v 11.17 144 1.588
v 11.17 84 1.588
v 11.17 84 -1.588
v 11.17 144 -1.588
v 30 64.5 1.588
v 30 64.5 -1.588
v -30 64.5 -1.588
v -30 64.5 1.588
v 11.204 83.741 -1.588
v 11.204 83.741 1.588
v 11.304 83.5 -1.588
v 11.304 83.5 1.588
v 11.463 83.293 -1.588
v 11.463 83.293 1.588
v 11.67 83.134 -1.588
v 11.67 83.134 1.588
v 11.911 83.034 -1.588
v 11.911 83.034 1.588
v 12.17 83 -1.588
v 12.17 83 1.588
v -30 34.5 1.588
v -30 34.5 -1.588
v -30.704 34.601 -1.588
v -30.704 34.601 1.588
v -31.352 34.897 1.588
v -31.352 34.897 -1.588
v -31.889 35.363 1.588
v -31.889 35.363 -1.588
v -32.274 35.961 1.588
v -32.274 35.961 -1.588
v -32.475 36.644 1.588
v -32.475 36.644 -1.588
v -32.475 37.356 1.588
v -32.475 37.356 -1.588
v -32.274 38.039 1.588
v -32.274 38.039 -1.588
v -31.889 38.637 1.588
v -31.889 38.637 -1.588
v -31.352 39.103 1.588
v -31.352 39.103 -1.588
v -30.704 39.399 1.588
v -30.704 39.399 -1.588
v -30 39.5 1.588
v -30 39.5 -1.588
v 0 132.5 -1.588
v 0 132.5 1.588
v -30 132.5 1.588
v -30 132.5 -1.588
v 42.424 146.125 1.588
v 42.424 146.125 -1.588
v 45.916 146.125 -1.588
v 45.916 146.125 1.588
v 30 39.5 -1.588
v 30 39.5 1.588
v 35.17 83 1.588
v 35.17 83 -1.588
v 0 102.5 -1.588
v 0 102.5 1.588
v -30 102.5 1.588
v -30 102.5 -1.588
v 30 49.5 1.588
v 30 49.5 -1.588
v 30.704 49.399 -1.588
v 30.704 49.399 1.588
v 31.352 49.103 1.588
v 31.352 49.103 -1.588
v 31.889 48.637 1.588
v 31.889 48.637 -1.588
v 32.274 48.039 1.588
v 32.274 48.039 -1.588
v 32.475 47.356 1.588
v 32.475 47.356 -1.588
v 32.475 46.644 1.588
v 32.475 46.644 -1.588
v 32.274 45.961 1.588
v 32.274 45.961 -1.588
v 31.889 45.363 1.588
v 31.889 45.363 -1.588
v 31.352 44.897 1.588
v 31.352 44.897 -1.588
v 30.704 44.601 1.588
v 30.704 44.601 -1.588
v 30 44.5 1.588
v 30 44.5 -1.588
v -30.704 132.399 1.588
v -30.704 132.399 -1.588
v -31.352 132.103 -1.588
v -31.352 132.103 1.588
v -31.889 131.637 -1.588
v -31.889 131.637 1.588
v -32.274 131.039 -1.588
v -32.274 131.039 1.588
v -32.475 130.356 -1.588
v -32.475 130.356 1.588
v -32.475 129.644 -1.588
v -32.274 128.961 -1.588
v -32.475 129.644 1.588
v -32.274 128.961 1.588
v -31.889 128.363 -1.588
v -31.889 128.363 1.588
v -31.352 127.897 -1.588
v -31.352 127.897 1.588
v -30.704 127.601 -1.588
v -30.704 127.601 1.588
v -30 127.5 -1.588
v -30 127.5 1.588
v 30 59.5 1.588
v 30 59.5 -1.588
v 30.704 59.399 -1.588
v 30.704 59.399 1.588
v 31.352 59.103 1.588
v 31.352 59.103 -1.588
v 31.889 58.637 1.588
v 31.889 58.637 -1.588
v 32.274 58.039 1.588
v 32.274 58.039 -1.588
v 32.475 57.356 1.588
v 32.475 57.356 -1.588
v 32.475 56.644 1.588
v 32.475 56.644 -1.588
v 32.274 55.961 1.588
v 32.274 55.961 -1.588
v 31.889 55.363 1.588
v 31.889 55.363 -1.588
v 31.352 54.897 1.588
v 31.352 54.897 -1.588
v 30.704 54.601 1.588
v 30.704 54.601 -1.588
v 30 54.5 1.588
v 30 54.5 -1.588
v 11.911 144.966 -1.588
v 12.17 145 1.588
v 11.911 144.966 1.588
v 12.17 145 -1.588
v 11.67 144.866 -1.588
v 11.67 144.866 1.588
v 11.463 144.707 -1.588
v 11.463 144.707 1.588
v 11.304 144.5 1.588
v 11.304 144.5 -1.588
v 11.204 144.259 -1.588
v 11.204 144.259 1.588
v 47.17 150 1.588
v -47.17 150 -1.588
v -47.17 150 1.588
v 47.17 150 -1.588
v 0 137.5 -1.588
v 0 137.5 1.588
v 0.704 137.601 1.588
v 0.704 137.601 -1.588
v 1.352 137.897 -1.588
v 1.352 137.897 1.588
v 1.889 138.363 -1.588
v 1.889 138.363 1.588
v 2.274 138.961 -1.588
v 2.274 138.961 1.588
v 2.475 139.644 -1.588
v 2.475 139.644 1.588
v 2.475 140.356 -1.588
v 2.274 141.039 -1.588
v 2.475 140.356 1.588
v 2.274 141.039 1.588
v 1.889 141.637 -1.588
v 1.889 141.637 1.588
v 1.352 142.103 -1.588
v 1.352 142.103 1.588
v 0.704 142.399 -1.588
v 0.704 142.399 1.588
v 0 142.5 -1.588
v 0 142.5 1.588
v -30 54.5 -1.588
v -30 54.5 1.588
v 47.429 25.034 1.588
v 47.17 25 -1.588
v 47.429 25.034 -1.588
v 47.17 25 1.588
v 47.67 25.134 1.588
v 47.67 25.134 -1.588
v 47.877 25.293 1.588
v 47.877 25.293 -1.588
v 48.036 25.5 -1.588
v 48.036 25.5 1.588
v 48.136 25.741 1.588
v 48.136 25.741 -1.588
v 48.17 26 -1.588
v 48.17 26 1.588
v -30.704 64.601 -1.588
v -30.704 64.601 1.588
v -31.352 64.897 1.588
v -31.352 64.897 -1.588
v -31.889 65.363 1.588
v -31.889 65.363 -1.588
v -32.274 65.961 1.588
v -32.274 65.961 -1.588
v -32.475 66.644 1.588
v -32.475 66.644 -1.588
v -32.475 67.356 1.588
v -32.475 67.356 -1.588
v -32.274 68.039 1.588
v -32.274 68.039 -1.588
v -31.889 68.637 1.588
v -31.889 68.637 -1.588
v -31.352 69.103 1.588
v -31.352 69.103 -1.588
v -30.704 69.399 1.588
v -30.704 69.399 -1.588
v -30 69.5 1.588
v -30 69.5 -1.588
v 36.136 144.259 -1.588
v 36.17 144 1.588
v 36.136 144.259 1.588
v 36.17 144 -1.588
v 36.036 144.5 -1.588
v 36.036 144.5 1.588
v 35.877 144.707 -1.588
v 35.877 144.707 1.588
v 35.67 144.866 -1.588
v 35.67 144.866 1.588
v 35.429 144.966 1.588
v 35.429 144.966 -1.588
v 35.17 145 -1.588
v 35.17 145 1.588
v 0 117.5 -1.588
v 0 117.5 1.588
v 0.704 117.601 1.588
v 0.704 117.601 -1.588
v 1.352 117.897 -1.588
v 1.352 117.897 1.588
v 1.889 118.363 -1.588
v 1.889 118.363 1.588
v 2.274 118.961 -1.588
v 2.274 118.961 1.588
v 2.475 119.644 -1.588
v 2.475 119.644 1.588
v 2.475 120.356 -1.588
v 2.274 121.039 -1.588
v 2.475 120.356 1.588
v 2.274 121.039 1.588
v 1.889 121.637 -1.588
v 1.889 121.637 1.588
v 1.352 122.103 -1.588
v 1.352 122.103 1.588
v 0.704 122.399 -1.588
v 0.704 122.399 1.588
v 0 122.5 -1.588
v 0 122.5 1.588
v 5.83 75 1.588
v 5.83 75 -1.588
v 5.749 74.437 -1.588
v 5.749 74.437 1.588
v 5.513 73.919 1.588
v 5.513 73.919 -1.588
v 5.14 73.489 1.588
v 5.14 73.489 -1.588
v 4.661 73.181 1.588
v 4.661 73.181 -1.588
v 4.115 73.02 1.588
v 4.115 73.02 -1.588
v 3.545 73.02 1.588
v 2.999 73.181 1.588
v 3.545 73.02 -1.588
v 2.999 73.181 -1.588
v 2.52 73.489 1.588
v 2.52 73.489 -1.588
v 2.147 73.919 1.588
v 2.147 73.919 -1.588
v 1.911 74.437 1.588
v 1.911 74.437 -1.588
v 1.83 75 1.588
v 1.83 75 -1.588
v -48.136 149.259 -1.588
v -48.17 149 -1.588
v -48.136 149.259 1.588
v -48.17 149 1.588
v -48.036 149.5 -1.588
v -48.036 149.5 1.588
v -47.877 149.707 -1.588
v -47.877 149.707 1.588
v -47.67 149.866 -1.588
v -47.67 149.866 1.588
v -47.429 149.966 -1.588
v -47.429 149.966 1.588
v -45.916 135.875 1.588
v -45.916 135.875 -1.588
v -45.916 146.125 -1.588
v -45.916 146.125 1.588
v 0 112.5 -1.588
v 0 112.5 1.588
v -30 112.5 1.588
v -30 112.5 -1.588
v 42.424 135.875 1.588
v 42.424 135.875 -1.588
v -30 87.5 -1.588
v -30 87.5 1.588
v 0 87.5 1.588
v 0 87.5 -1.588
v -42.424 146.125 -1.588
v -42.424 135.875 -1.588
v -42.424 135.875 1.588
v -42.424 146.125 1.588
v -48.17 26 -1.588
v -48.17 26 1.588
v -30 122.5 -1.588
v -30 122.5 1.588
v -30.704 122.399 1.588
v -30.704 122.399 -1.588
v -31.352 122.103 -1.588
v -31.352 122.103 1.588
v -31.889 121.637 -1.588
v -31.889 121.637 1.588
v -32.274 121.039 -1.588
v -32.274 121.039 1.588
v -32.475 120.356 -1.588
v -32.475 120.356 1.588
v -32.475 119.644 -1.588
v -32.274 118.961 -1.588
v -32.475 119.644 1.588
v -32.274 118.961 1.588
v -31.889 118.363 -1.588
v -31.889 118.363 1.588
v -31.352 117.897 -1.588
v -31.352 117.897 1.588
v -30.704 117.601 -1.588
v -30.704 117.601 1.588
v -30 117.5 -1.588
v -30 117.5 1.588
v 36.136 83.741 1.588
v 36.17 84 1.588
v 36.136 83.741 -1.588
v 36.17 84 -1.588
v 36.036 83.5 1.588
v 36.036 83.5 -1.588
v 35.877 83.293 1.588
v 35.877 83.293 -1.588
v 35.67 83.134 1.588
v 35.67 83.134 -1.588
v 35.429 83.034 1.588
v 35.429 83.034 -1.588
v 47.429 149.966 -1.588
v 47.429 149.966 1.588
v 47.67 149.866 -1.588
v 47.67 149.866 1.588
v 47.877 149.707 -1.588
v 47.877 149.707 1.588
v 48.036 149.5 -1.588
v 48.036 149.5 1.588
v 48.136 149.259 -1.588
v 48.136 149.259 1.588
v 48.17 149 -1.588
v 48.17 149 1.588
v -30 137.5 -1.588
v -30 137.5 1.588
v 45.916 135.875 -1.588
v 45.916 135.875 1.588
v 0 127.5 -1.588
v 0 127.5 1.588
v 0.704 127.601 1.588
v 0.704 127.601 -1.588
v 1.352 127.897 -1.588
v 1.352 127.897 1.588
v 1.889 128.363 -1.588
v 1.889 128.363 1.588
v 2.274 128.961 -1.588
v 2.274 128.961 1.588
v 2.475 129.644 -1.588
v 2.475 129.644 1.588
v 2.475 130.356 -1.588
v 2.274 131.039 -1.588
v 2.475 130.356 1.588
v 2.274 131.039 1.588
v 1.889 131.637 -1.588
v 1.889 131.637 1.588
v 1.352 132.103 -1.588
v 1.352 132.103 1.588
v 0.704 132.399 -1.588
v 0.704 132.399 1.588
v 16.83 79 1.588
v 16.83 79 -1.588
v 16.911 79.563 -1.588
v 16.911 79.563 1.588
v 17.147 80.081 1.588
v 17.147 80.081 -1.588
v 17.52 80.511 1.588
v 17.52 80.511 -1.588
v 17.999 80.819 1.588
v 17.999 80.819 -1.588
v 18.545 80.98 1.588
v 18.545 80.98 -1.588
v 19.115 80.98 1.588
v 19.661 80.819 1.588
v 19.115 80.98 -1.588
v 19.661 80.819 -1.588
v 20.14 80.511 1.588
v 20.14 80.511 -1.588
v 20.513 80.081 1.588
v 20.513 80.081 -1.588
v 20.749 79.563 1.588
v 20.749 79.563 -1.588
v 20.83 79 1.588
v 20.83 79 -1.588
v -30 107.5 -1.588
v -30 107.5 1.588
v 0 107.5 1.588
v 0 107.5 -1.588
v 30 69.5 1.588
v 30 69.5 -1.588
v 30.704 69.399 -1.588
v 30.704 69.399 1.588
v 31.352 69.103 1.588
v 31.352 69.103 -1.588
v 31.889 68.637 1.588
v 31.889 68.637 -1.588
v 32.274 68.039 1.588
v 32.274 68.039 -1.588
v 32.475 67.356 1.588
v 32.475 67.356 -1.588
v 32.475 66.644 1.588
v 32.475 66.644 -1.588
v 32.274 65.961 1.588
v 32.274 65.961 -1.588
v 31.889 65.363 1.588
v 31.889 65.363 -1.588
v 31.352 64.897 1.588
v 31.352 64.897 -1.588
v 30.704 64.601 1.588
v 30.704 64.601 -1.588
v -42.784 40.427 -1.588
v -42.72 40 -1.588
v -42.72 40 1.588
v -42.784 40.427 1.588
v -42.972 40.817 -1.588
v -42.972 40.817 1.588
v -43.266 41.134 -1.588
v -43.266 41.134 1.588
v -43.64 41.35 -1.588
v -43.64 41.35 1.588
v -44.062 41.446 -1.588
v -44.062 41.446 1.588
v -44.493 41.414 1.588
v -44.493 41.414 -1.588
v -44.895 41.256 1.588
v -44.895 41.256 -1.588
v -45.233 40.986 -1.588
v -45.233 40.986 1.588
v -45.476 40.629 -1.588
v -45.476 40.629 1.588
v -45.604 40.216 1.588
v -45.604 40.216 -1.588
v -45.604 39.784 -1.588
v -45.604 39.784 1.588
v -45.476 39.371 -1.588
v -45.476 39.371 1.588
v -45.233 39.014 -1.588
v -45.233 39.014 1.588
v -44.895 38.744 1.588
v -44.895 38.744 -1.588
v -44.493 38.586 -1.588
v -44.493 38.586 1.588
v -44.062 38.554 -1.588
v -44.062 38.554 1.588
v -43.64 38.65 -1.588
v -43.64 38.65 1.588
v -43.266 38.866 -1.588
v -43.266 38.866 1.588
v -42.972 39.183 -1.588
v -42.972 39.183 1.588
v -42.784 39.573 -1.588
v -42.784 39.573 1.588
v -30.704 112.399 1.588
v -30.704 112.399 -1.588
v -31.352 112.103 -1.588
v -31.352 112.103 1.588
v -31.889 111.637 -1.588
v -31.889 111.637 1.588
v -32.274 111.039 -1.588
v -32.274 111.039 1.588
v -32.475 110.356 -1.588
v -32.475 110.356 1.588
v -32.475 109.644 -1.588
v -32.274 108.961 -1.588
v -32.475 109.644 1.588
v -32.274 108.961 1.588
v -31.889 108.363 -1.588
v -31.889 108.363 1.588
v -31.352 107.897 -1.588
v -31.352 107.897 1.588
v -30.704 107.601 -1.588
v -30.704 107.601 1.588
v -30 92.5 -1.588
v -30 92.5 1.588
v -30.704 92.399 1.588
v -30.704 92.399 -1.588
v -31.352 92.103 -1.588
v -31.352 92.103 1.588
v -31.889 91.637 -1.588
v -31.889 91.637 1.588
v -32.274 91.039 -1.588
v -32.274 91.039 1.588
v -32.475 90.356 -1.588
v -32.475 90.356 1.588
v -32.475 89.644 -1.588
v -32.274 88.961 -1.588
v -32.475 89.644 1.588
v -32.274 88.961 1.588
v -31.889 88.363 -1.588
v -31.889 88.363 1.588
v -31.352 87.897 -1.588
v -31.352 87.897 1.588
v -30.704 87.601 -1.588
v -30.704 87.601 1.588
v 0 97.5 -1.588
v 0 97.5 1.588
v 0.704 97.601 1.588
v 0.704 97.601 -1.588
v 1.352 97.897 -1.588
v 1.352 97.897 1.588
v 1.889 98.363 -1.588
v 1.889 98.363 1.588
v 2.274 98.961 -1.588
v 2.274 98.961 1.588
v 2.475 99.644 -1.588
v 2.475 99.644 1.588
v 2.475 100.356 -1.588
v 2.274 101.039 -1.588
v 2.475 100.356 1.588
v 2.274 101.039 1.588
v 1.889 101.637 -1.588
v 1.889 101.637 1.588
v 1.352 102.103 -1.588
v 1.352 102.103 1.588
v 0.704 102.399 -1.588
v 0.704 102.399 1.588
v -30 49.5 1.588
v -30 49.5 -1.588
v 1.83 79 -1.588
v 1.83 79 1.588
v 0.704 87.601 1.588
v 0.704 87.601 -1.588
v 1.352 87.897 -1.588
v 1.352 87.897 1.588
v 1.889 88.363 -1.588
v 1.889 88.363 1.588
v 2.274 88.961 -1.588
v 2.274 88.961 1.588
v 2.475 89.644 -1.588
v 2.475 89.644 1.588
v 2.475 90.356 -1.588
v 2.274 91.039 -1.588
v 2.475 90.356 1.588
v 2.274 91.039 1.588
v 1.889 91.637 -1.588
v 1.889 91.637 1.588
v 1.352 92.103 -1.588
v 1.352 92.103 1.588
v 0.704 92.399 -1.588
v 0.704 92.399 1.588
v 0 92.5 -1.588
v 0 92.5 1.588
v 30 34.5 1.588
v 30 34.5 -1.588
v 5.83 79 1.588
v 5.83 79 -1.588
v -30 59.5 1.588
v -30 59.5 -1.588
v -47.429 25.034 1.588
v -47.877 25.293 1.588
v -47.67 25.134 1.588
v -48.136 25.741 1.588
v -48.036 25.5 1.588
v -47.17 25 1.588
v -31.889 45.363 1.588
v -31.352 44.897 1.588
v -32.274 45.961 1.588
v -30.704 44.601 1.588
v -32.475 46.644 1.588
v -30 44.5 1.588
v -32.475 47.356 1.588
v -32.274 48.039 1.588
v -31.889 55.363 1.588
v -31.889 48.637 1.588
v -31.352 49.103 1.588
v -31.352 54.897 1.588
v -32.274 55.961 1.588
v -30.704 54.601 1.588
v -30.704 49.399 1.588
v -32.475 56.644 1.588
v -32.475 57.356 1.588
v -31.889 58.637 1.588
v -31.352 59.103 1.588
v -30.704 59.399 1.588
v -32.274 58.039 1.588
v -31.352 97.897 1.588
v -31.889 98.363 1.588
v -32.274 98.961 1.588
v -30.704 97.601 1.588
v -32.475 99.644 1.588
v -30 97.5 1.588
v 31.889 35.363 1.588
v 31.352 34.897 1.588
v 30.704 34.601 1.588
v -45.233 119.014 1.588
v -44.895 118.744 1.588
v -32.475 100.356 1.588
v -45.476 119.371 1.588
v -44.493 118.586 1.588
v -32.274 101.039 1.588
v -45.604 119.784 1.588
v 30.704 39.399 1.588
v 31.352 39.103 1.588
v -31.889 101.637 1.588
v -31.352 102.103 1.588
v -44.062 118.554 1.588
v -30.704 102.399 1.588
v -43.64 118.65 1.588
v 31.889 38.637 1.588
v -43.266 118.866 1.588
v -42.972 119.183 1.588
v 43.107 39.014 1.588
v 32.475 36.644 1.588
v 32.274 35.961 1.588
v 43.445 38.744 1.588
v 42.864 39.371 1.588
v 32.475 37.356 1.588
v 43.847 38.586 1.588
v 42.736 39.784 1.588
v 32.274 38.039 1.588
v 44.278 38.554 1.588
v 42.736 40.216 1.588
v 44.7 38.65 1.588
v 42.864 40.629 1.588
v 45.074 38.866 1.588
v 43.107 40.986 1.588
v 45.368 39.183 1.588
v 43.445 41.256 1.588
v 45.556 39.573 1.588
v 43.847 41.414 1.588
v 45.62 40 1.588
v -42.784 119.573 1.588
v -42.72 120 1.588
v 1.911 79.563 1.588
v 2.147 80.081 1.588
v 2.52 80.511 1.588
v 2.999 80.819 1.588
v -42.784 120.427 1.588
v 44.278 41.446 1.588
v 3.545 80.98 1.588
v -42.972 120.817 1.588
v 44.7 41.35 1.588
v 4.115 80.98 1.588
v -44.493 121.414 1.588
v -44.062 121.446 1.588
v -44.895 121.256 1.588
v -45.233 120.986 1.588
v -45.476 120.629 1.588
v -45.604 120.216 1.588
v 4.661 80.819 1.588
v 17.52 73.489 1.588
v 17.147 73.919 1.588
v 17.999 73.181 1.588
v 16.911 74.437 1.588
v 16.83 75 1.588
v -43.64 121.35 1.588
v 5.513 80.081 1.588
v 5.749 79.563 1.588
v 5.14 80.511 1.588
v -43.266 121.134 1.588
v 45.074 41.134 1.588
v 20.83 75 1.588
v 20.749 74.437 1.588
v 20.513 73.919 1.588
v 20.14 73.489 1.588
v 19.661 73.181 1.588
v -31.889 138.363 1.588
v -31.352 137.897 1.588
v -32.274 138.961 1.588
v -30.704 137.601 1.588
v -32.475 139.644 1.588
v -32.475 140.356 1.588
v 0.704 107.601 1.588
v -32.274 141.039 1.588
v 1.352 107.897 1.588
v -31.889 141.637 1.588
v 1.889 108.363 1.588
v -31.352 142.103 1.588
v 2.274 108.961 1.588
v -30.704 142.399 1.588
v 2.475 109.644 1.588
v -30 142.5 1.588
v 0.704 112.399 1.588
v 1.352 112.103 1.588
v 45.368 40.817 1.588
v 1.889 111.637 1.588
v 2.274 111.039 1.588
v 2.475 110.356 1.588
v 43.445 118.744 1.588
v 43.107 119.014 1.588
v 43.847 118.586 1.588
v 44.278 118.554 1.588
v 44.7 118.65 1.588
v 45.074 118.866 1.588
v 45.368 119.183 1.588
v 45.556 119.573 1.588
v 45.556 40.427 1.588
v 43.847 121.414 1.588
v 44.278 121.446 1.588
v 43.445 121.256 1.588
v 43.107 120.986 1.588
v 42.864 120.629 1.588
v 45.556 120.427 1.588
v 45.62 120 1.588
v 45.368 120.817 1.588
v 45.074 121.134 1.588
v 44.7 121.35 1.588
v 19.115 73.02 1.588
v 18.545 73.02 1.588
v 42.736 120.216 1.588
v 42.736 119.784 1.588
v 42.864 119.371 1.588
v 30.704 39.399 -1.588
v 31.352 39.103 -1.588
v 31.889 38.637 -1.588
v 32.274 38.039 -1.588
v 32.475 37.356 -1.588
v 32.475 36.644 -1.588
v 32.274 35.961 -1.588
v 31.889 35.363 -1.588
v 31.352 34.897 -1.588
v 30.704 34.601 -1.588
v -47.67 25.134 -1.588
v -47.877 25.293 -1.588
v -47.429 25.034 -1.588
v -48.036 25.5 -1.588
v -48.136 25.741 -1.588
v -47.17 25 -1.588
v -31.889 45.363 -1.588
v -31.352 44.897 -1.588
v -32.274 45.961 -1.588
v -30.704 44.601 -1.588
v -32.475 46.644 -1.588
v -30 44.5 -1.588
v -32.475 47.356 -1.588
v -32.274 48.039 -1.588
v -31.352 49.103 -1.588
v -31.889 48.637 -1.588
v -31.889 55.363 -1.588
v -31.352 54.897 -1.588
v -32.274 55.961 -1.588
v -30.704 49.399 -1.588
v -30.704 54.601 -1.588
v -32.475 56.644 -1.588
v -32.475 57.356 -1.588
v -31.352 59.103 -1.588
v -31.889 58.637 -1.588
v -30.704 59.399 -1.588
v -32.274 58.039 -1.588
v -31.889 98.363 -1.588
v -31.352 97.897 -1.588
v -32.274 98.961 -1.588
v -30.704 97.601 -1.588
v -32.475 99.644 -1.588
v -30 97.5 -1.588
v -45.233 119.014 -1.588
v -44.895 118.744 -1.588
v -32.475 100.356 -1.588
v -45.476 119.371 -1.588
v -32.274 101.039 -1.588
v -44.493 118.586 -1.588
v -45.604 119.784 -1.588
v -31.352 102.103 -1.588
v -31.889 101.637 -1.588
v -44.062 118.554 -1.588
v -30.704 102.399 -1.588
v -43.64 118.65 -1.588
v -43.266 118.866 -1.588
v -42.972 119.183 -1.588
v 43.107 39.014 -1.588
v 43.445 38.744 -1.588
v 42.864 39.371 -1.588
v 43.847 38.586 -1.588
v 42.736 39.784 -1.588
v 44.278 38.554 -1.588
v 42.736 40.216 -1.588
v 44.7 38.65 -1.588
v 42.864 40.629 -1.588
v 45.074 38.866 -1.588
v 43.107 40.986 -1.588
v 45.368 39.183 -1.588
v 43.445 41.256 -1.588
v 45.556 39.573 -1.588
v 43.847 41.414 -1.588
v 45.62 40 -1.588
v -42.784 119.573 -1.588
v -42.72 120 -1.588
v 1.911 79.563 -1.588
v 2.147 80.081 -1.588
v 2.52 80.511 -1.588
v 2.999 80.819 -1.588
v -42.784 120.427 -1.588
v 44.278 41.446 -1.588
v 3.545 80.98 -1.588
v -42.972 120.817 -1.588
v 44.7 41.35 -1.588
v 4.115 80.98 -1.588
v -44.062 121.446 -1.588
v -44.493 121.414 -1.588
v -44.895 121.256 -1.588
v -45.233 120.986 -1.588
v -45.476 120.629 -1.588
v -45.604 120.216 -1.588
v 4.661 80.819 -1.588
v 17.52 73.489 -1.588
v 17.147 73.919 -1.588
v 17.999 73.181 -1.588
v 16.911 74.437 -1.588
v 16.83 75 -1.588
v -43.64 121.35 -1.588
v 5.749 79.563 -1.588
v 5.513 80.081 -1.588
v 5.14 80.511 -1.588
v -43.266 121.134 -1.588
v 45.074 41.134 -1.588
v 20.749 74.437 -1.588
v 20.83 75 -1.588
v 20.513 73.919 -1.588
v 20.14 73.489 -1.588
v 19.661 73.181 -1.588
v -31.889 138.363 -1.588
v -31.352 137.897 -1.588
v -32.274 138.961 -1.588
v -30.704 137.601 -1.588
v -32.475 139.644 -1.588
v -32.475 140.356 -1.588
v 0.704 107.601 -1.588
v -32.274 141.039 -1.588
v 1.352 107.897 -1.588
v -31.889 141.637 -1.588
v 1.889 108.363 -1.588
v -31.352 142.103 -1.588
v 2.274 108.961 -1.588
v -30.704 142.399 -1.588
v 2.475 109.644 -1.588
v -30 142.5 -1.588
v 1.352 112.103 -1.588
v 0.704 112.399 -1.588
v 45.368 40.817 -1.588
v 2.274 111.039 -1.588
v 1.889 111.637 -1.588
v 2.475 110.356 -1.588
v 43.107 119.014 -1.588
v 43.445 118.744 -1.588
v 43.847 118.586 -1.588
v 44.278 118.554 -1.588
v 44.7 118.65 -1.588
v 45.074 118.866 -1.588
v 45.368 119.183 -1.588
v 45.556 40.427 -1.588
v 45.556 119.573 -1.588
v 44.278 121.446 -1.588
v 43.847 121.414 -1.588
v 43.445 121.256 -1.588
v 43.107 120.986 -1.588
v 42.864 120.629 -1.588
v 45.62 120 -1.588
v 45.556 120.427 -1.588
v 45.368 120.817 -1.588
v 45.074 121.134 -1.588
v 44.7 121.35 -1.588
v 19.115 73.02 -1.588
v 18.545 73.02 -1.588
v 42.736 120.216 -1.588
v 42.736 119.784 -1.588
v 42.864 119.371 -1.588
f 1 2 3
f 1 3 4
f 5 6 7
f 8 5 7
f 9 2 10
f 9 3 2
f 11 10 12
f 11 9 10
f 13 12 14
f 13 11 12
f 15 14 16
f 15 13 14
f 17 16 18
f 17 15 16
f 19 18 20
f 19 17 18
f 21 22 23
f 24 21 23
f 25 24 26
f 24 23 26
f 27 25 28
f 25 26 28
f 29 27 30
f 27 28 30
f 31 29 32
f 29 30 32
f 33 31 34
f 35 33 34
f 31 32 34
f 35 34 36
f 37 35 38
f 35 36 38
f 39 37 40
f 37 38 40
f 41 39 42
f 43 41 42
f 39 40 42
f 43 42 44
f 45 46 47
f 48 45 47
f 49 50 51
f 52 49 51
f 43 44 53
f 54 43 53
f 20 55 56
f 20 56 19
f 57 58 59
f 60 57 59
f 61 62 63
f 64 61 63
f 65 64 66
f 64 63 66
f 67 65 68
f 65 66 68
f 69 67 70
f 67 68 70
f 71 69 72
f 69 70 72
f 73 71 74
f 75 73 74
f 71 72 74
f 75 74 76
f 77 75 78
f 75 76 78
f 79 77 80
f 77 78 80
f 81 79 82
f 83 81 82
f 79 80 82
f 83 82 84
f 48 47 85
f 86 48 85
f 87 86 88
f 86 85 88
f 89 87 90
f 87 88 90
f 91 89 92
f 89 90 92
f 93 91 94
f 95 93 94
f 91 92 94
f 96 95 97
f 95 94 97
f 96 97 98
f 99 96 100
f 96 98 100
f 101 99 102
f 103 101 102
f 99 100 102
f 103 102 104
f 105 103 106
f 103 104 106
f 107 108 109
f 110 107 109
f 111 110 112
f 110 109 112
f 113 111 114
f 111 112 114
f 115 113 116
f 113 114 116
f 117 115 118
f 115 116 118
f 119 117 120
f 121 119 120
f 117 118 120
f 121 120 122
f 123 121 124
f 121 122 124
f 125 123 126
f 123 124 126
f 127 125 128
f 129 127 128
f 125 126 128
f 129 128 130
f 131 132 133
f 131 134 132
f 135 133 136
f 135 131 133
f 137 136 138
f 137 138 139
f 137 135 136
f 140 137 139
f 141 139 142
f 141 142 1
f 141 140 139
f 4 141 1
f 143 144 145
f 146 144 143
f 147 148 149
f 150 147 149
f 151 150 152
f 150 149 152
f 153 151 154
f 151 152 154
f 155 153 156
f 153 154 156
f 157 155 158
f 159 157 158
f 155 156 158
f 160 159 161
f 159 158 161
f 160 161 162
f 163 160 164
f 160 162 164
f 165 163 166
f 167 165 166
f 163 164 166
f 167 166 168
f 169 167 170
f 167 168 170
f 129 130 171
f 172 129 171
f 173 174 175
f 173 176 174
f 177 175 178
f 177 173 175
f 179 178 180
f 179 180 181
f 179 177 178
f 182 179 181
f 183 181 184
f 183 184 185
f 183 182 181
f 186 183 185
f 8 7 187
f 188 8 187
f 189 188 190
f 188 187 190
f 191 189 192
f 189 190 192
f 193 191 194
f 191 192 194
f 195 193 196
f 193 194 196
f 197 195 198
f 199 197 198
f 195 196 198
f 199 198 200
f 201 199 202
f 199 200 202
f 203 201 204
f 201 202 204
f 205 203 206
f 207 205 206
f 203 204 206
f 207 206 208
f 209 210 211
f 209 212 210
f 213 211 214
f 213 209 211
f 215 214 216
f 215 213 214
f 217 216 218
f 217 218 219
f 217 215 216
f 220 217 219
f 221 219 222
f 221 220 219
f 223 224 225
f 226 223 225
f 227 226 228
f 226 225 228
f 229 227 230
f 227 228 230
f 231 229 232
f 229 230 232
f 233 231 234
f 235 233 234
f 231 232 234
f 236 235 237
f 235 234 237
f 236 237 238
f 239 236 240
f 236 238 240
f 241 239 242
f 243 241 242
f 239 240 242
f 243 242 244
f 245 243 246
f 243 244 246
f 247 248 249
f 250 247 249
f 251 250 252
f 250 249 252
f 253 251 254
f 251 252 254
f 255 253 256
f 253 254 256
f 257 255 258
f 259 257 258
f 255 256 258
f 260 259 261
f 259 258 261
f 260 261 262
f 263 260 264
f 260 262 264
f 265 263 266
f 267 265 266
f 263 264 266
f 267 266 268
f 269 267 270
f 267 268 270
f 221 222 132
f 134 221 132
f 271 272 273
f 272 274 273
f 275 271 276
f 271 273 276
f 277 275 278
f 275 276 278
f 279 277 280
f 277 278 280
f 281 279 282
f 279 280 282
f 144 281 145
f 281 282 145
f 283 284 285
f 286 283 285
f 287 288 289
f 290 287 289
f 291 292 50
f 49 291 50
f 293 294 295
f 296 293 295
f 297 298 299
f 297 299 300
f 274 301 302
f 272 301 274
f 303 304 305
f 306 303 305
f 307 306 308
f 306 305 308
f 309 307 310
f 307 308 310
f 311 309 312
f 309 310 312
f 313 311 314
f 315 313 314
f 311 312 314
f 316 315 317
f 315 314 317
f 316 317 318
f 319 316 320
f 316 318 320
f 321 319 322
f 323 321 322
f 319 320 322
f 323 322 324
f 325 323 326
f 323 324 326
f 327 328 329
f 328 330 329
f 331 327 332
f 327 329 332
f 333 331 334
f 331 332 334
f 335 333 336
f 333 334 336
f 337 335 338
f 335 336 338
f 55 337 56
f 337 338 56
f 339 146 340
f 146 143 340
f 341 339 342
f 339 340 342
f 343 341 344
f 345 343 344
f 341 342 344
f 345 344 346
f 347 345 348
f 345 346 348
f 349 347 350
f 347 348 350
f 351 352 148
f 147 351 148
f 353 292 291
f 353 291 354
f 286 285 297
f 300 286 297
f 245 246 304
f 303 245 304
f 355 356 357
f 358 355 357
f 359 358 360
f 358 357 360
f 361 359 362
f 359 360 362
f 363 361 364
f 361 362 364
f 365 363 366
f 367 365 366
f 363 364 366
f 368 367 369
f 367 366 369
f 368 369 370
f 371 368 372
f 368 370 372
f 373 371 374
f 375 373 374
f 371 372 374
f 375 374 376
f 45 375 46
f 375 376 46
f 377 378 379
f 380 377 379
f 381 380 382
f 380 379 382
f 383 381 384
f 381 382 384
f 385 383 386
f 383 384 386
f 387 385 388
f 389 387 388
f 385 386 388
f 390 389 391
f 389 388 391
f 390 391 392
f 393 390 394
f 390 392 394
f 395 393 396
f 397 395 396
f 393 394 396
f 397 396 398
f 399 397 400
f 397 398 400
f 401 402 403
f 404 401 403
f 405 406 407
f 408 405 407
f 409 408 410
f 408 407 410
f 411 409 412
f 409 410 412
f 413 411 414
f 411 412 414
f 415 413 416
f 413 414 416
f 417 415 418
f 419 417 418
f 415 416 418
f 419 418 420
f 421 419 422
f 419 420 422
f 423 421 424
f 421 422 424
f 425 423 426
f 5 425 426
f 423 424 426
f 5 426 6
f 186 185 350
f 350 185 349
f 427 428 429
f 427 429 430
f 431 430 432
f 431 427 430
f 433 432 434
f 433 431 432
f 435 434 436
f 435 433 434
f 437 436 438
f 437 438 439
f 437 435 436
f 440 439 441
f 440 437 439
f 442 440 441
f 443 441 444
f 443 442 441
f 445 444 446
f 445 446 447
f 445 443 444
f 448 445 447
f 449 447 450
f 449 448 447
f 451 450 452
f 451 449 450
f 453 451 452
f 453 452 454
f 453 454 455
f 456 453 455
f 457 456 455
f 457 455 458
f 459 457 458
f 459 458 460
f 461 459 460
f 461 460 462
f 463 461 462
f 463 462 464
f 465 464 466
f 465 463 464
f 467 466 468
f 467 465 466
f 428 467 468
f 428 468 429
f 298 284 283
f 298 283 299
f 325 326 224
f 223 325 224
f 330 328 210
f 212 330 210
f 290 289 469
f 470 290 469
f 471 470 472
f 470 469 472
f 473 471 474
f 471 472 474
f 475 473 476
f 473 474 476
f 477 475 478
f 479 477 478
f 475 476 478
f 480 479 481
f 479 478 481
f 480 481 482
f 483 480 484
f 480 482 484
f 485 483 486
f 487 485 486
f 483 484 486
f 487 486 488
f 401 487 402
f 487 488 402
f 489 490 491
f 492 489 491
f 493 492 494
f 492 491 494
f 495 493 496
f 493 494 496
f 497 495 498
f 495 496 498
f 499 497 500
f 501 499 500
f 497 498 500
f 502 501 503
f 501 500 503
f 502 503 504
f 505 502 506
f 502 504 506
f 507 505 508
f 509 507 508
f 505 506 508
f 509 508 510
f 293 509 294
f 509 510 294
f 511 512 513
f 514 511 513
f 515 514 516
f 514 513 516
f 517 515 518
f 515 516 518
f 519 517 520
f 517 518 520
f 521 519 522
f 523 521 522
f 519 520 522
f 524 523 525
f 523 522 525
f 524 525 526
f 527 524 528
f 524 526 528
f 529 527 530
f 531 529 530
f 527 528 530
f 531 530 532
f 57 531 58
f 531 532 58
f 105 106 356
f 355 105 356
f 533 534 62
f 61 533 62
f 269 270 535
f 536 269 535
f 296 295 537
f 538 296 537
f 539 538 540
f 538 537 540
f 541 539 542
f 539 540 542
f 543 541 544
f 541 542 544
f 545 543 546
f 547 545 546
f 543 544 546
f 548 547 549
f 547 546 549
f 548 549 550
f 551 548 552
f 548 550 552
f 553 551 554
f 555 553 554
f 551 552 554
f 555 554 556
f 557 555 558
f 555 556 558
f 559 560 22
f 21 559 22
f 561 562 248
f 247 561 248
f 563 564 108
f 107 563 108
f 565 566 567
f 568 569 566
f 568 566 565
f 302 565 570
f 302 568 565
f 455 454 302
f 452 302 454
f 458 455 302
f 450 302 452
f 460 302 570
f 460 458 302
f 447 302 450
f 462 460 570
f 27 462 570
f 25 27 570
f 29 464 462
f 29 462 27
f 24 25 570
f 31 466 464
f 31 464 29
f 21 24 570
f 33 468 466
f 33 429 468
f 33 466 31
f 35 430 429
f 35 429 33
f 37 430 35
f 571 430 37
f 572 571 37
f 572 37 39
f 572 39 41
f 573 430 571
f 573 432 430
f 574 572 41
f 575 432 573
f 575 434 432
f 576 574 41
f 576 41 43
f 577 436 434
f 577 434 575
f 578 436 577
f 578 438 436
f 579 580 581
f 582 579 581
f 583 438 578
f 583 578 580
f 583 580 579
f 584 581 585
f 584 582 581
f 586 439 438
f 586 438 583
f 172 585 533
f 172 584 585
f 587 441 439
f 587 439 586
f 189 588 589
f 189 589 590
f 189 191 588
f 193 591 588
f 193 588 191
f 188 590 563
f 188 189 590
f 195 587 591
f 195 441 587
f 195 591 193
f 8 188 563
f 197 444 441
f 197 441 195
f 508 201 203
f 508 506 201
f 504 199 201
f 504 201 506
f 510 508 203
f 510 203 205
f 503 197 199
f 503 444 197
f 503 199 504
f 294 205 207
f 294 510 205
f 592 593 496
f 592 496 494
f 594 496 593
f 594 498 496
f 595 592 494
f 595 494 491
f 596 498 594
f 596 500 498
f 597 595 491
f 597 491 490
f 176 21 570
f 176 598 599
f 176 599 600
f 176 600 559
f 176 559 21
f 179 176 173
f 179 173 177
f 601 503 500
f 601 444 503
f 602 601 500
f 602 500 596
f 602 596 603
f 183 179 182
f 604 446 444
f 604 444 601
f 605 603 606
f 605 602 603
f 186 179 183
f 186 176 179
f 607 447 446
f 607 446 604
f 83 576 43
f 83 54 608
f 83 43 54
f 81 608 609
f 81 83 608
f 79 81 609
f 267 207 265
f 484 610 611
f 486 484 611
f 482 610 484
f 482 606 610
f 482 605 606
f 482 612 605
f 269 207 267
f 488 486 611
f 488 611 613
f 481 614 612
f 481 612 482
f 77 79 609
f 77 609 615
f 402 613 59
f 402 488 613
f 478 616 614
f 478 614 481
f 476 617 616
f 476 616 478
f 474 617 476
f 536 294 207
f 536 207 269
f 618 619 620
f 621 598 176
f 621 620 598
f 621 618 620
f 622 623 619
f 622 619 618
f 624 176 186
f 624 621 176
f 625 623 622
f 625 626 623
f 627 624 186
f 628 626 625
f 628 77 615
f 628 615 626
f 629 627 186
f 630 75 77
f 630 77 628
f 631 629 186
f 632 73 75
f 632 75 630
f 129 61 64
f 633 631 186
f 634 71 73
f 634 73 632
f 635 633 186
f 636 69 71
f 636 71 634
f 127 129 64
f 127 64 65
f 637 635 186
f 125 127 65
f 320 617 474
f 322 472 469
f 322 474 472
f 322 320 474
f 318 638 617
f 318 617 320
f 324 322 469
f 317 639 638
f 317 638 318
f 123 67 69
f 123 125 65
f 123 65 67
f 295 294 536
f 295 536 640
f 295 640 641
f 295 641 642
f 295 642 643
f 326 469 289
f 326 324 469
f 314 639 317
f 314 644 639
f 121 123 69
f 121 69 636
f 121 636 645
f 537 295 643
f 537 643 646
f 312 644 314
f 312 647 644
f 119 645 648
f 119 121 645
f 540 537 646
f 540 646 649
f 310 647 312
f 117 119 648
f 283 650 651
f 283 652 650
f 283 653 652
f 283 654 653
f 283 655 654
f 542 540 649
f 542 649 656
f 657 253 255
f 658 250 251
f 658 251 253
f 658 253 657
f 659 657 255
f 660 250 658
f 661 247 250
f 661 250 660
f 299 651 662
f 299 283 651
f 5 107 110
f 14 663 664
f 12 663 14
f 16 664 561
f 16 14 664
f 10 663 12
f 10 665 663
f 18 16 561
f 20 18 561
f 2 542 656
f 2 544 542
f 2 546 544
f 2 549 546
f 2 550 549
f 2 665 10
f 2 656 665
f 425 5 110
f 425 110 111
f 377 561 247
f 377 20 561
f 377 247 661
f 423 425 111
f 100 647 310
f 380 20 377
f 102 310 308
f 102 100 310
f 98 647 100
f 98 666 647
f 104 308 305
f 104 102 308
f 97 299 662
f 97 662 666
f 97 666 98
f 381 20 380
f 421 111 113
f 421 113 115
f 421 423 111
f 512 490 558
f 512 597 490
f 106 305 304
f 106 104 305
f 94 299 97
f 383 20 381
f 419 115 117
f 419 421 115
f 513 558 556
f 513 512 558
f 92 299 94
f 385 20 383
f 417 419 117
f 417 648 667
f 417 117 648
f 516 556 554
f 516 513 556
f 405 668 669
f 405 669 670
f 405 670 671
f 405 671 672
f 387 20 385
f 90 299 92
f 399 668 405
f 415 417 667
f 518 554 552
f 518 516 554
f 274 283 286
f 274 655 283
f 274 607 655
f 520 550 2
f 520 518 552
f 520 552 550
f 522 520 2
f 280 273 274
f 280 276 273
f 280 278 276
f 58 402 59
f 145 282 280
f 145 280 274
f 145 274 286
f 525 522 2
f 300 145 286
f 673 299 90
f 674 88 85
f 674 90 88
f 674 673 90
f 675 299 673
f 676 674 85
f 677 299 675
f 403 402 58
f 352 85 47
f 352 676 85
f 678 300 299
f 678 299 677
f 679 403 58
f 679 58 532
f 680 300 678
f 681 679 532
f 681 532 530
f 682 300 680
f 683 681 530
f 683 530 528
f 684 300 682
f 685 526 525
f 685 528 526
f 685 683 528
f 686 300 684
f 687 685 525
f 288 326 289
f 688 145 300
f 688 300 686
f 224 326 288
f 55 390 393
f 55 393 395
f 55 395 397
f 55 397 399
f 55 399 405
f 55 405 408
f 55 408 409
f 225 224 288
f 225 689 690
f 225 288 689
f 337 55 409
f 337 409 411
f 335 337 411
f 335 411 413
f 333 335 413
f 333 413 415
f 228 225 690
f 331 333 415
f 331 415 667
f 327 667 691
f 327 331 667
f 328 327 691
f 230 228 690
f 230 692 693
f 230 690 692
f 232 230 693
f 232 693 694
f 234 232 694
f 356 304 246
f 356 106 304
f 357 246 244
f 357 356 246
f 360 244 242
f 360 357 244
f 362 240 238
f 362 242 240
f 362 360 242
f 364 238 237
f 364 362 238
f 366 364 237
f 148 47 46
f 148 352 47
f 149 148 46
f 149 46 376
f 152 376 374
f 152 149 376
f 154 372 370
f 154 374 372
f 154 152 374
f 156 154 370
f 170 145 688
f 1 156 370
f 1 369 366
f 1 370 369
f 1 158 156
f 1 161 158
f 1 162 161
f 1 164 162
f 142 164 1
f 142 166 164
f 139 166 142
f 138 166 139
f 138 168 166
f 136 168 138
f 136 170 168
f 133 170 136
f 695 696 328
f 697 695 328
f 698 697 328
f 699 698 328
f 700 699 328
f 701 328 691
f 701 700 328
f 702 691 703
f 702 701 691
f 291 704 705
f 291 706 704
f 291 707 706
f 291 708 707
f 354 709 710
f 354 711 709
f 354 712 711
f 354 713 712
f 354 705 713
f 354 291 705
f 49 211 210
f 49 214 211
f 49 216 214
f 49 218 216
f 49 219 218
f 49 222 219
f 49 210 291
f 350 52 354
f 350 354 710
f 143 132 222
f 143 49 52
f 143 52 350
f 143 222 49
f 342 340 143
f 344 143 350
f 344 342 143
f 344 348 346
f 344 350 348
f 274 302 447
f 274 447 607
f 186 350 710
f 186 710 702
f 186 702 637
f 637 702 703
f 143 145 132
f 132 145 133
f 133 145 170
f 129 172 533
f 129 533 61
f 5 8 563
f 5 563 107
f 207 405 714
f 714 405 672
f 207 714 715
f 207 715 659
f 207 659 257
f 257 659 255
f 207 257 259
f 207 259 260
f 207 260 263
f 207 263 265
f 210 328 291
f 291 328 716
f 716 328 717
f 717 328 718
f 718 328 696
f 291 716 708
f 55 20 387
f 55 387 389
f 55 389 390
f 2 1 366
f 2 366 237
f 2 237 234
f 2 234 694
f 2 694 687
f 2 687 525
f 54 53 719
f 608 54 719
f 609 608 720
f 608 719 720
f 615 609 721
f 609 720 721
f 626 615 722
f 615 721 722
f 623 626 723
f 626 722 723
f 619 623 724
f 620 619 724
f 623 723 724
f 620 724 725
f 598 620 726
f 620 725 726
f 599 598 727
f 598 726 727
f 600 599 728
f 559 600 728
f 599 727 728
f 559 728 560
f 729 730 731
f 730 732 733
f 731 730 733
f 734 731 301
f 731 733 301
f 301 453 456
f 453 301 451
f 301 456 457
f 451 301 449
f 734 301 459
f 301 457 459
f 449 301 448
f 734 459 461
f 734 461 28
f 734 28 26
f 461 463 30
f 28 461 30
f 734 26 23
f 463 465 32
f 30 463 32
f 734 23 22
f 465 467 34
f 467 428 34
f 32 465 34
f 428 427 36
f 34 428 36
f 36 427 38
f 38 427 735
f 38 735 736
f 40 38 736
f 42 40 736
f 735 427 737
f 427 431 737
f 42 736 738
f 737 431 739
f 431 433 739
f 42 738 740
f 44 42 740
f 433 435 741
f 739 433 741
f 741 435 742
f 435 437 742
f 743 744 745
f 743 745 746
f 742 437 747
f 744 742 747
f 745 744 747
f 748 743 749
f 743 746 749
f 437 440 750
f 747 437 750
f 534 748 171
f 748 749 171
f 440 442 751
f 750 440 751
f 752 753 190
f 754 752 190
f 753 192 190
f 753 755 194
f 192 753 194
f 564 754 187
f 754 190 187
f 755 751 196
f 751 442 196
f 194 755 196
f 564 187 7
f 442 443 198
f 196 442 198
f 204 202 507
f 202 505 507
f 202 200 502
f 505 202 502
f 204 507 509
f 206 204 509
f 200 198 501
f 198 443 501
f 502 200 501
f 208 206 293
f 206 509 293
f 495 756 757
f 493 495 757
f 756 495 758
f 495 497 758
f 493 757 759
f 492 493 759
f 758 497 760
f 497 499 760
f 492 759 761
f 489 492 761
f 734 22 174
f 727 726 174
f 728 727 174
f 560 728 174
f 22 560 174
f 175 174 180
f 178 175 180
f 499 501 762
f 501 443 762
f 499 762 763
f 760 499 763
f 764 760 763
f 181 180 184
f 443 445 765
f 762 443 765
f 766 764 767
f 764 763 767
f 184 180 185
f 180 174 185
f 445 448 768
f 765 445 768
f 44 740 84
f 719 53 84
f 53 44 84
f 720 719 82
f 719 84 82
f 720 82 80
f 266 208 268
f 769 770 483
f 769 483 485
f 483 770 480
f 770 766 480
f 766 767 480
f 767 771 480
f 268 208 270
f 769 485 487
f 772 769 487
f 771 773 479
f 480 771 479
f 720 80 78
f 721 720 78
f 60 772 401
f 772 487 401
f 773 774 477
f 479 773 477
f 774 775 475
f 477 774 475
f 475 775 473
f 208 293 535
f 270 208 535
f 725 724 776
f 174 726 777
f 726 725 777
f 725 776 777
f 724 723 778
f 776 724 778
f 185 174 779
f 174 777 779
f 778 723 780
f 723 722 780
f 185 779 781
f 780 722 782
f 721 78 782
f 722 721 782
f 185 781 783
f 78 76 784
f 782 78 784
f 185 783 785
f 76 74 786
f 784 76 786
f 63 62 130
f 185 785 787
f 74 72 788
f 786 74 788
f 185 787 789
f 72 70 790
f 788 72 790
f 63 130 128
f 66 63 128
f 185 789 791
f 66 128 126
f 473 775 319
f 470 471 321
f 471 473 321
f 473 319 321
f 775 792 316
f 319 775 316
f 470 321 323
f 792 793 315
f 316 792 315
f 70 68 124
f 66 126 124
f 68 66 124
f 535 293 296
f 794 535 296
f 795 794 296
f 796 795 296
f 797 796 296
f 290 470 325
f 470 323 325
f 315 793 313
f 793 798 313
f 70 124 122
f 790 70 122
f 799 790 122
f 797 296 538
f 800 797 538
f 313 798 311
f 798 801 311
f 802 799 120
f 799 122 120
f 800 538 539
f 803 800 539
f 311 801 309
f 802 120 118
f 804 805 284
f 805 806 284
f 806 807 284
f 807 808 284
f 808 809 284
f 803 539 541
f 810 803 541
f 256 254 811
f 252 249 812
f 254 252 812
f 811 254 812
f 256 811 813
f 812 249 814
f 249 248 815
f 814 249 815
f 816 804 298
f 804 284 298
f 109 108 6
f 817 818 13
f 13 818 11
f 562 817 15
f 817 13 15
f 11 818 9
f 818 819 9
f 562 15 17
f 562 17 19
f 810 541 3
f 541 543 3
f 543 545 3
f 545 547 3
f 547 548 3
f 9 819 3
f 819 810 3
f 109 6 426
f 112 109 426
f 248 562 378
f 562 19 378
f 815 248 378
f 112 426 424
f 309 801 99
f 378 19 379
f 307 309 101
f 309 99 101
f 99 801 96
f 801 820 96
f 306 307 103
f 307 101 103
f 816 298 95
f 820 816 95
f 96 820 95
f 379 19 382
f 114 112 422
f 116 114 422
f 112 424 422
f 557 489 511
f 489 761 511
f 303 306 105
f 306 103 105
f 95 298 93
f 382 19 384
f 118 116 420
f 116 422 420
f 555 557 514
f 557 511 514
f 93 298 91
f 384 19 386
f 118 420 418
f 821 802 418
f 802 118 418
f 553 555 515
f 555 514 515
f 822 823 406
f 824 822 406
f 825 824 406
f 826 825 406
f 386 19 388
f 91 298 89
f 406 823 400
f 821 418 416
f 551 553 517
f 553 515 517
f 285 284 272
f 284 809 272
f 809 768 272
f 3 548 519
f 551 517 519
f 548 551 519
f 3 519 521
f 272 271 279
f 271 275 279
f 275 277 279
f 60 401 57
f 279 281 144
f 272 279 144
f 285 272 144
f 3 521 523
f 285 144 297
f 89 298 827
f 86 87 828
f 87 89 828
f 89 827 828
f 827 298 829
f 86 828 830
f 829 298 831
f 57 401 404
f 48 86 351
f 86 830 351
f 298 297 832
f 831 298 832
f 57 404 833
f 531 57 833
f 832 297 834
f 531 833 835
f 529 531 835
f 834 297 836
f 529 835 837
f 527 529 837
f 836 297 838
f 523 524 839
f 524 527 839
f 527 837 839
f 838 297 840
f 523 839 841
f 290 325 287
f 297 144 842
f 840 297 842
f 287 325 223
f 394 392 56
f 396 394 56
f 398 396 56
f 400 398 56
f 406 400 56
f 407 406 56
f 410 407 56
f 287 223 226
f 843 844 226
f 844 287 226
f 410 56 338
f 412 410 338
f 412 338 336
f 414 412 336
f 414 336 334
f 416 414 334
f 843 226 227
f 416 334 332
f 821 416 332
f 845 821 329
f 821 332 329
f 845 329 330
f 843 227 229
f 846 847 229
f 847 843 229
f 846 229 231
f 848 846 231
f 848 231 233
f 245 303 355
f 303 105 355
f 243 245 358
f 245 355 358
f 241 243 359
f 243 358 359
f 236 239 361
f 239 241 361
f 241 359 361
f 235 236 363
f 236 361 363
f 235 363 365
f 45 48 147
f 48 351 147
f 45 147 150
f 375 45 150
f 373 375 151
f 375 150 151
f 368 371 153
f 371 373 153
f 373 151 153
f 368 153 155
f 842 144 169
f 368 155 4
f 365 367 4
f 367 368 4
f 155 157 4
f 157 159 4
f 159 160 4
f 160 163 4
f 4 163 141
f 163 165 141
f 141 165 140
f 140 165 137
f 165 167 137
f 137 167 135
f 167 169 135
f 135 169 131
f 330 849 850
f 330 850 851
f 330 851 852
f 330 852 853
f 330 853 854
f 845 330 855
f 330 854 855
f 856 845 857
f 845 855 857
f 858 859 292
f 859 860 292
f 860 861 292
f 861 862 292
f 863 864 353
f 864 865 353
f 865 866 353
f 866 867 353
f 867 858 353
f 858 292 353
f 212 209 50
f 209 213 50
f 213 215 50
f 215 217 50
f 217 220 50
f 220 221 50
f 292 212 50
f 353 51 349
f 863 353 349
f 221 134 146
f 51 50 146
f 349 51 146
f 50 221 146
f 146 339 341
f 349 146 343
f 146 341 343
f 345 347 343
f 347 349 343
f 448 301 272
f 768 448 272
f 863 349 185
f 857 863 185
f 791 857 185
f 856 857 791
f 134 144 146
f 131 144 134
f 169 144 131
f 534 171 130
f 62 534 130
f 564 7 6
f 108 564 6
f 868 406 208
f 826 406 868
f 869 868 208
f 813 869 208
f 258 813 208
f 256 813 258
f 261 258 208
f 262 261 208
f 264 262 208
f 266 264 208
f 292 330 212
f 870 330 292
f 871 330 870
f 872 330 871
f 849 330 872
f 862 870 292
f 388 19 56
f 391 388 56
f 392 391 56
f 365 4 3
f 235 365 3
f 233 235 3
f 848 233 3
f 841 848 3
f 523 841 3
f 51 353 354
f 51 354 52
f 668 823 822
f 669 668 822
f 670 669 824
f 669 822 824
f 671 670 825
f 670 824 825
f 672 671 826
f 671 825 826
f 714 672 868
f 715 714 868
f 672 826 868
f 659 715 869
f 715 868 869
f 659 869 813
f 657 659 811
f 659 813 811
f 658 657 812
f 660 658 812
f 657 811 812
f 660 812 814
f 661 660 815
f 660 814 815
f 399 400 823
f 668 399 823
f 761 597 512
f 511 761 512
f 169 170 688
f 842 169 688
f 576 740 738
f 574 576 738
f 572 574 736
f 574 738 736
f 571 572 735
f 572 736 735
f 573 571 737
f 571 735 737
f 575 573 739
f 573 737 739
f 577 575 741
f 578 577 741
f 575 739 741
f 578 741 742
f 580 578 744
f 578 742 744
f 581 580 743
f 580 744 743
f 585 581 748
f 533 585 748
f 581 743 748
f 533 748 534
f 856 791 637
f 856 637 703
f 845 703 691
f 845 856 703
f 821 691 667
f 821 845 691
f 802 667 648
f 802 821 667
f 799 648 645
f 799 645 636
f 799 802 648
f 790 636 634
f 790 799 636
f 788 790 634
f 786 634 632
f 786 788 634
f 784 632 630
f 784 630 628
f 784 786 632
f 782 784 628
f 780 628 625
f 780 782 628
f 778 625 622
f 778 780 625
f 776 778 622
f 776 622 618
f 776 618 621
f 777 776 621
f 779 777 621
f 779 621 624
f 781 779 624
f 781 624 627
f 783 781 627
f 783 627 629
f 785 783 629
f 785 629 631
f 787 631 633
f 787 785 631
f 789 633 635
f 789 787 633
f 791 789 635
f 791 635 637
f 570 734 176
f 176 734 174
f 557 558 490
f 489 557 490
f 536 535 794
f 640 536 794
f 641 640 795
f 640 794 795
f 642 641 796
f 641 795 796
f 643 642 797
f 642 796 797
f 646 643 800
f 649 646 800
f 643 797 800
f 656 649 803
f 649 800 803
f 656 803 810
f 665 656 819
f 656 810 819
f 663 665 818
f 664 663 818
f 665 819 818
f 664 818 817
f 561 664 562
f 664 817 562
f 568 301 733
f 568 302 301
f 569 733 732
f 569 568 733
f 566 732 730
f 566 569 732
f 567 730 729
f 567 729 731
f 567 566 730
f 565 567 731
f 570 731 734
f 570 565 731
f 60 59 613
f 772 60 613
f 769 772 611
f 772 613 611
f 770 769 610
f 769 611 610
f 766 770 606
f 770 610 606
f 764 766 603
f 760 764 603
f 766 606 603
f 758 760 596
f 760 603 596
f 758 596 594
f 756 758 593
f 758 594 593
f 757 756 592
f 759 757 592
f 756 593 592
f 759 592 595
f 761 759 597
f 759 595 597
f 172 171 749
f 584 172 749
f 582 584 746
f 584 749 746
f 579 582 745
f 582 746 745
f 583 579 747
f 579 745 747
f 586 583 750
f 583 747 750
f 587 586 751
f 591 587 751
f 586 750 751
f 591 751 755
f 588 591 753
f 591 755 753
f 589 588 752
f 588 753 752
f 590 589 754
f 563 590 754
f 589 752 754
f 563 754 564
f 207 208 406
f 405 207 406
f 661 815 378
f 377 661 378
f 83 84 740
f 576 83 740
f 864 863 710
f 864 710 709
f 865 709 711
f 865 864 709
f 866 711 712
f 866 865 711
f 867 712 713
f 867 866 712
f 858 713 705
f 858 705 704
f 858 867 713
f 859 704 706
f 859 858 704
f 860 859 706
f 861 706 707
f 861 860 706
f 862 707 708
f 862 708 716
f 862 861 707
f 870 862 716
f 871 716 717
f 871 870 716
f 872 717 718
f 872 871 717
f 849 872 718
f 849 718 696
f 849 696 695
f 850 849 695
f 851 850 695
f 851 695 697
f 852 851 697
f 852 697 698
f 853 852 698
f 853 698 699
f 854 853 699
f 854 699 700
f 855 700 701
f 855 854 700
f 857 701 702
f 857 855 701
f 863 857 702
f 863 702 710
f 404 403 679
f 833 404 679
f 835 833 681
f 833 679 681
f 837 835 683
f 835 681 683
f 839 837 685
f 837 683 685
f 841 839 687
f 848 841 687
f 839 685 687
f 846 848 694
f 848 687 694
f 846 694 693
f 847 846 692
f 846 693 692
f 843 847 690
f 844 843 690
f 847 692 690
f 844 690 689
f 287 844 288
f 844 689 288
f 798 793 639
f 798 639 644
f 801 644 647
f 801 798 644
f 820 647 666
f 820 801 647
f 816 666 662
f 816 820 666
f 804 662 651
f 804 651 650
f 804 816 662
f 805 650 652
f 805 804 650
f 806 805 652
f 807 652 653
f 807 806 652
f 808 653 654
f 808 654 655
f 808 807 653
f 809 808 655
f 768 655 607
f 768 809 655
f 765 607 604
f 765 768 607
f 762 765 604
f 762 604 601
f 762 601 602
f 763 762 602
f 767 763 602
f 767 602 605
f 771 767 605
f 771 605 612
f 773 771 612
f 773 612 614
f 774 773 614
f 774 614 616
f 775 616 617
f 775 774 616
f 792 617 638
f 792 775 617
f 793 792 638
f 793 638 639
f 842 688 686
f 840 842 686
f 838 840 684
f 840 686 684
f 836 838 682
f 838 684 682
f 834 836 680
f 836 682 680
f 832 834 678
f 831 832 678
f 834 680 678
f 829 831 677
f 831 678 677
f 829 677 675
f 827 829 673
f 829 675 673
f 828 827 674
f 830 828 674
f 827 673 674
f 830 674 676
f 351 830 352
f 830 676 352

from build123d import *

# Parameters (mm, degrees)
STOCK_TORSO_REAR_PLATE_1_START       = -1.5875
STOCK_TORSO_REAR_PLATE_1_OUTLINE_W   = 96.34
STOCK_TORSO_REAR_PLATE_1_OUTLINE_H   = 125.5
STOCK_TORSO_REAR_PLATE_1_OUTLINE_R   = 1.45
STOCK_TORSO_REAR_PLATE_1_OUTLINE_W_2 = 3.4925
STOCK_TORSO_REAR_PLATE_1_OUTLINE_H_2 = 10.25
STOCK_TORSO_REAR_PLATE_1_DEPTH       = 3.175
MOVE_FACE1_BY                        = 0.5
CUT_EXTRUDE1_DEPTH                   = 158.576741701
CUT_EXTRUDE1_DEPTH_BACK              = 158.576741701
CUT_EXTRUDE2_DEPTH                   = 158.576741701
CUT_EXTRUDE2_DEPTH_BACK              = 158.576741701
SKETCH2_W                            = 25
SKETCH2_H                            = 62
FILLET1_R                            = 1
CUT_EXTRUDE3_DEPTH                   = 158.576741701
CUT_EXTRUDE3_DEPTH_BACK              = 158.576741701
FILLET2_R                            = 1


# Read off the part's stored shape, not the designer's step: Stock-torso_rear_plate-1
with BuildPart() as part:
    # Stock-torso_rear_plate-1 outline → Stock-torso_rear_plate-1 (new body)
    with BuildSketch(Plane.XY.offset(STOCK_TORSO_REAR_PLATE_1_START)):
        with Locations((0, 87.25)):
            Rectangle(STOCK_TORSO_REAR_PLATE_1_OUTLINE_W, STOCK_TORSO_REAR_PLATE_1_OUTLINE_H)
        with Locations((-44.17, 40)):
            Circle(STOCK_TORSO_REAR_PLATE_1_OUTLINE_R, mode=Mode.SUBTRACT)
        with BuildLine():
            Line((30, 34.5), (-30, 34.5))
            ThreePointArc((-30, 34.5), (-32.5, 37), (-30, 39.5))
            Line((-30, 39.5), (30, 39.5))
            ThreePointArc((30, 39.5), (32.5, 37), (30, 34.5))
        make_face(mode=Mode.SUBTRACT)
        with BuildLine():
            Line((30, 44.5), (-30, 44.5))
            ThreePointArc((-30, 44.5), (-32.5, 47), (-30, 49.5))
            Line((-30, 49.5), (30, 49.5))
            ThreePointArc((30, 49.5), (32.5, 47), (30, 44.5))
        make_face(mode=Mode.SUBTRACT)
        with Locations((44.17, 40)):
            Circle(STOCK_TORSO_REAR_PLATE_1_OUTLINE_R, mode=Mode.SUBTRACT)
        with BuildLine():
            ThreePointArc((-30, 54.5), (-32.5, 57), (-30, 59.5))
            Line((-30, 59.5), (30, 59.5))
            ThreePointArc((30, 59.5), (32.5, 57), (30, 54.5))
            Line((30, 54.5), (-30, 54.5))
        make_face(mode=Mode.SUBTRACT)
        with BuildLine():
            ThreePointArc((-30, 64.5), (-32.5, 67), (-30, 69.5))
            Line((-30, 69.5), (30, 69.5))
            ThreePointArc((30, 69.5), (32.5, 67), (30, 64.5))
            Line((30, 64.5), (-30, 64.5))
        make_face(mode=Mode.SUBTRACT)
        with Locations((-44.17, 120)):
            Circle(STOCK_TORSO_REAR_PLATE_1_OUTLINE_R, mode=Mode.SUBTRACT)
        with Locations((-44.17, 141)):
            Rectangle(STOCK_TORSO_REAR_PLATE_1_OUTLINE_W_2, STOCK_TORSO_REAR_PLATE_1_OUTLINE_H_2, mode=Mode.SUBTRACT)
        with Locations((44.17, 120)):
            Circle(STOCK_TORSO_REAR_PLATE_1_OUTLINE_R, mode=Mode.SUBTRACT)
        with Locations((44.17, 141)):
            Rectangle(STOCK_TORSO_REAR_PLATE_1_OUTLINE_W_2, STOCK_TORSO_REAR_PLATE_1_OUTLINE_H_2, mode=Mode.SUBTRACT)
    extrude(amount=STOCK_TORSO_REAR_PLATE_1_DEPTH)

    # Move Face1: a face moved inward by 0.5
    extrude(part.faces().sort_by_distance((0, 24.5, 0))[0], amount=MOVE_FACE1_BY, dir=(0, 1, 0), mode=Mode.SUBTRACT)

    # Sketch1 → Cut-Extrude1 (cut, two sides: drawn at the far end of the back side and taken through both)
    with BuildSketch(Plane.XY.offset(1.5875).offset(-CUT_EXTRUDE1_DEPTH_BACK)):
        with BuildLine():
            Line((1.83, 75), (1.83, 79))
            ThreePointArc((1.83, 79), (3.83, 81), (5.83, 79))
            Line((5.83, 79), (5.83, 75))
            ThreePointArc((5.83, 75), (3.83, 73), (1.83, 75))
        make_face()
        with BuildLine():
            Line((16.83, 75), (16.83, 79))
            ThreePointArc((16.83, 79), (18.83, 81), (20.83, 79))
            Line((20.83, 79), (20.83, 75))
            ThreePointArc((20.83, 75), (18.83, 73), (16.83, 75))
        make_face()
    extrude(amount=CUT_EXTRUDE1_DEPTH + CUT_EXTRUDE1_DEPTH_BACK, mode=Mode.SUBTRACT)

    # Sketch2 → Cut-Extrude2 (cut, two sides: drawn at the far end of the back side and taken through both)
    with BuildSketch(Plane(origin=(0, 0, -1.5875), x_dir=(-1, 0, 0), z_dir=(0, 0, -1)).offset(-CUT_EXTRUDE2_DEPTH_BACK)):
        with Locations((-23.67, 114)):
            Rectangle(SKETCH2_W, SKETCH2_H)
    extrude(amount=CUT_EXTRUDE2_DEPTH + CUT_EXTRUDE2_DEPTH_BACK, mode=Mode.SUBTRACT)

    # Fillet1
    fillet1_edges = [part.edges().sort_by_distance(p)[0] for p in [
        (36.17, 83, 0),
        (36.17, 145, 0),
        (11.17, 145, 0),
        (11.17, 83, 0),
    ]]
    fillet(fillet1_edges, radius=FILLET1_R)

    # Sketch3 → Cut-Extrude3 (cut, two sides: drawn at the far end of the back side and taken through both)
    with BuildSketch(Plane(origin=(0, 0, -1.5875), x_dir=(-1, 0, 0), z_dir=(0, 0, -1)).offset(-CUT_EXTRUDE3_DEPTH_BACK)):
        with BuildLine():
            Line((0, 92.5), (30, 92.5))
            ThreePointArc((30, 92.5), (32.5, 90), (30, 87.5))
            Line((30, 87.5), (0, 87.5))
            ThreePointArc((0, 87.5), (-2.5, 90), (0, 92.5))
        make_face()
        with BuildLine():
            Line((0, 102.5), (30, 102.5))
            ThreePointArc((30, 102.5), (32.5, 100), (30, 97.5))
            Line((30, 97.5), (0, 97.5))
            ThreePointArc((0, 97.5), (-2.5, 100), (0, 102.5))
        make_face()
        with BuildLine():
            Line((0, 112.5), (30, 112.5))
            ThreePointArc((30, 112.5), (32.5, 110), (30, 107.5))
            Line((30, 107.5), (0, 107.5))
            ThreePointArc((0, 107.5), (-2.5, 110), (0, 112.5))
        make_face()
        with BuildLine():
            Line((0, 122.5), (30, 122.5))
            ThreePointArc((30, 122.5), (32.5, 120), (30, 117.5))
            Line((30, 117.5), (0, 117.5))
            ThreePointArc((0, 117.5), (-2.5, 120), (0, 122.5))
        make_face()
        with BuildLine():
            Line((0, 132.5), (30, 132.5))
            ThreePointArc((30, 132.5), (32.5, 130), (30, 127.5))
            Line((30, 127.5), (0, 127.5))
            ThreePointArc((0, 127.5), (-2.5, 130), (0, 132.5))
        make_face()
        with BuildLine():
            Line((0, 142.5), (30, 142.5))
            ThreePointArc((30, 142.5), (32.5, 140), (30, 137.5))
            Line((30, 137.5), (0, 137.5))
            ThreePointArc((0, 137.5), (-2.5, 140), (0, 142.5))
        make_face()
    extrude(amount=CUT_EXTRUDE3_DEPTH + CUT_EXTRUDE3_DEPTH_BACK, mode=Mode.SUBTRACT)

    # Fillet2
    fillet2_edges = [part.edges().sort_by_distance(p)[0] for p in [
        (48.17, 25, 0),
        (-48.17, 25, 0),
        (48.17, 150, 0),
        (-48.17, 150, 0),
    ]]
    fillet(fillet2_edges, radius=FILLET2_R)


solid = part.part
